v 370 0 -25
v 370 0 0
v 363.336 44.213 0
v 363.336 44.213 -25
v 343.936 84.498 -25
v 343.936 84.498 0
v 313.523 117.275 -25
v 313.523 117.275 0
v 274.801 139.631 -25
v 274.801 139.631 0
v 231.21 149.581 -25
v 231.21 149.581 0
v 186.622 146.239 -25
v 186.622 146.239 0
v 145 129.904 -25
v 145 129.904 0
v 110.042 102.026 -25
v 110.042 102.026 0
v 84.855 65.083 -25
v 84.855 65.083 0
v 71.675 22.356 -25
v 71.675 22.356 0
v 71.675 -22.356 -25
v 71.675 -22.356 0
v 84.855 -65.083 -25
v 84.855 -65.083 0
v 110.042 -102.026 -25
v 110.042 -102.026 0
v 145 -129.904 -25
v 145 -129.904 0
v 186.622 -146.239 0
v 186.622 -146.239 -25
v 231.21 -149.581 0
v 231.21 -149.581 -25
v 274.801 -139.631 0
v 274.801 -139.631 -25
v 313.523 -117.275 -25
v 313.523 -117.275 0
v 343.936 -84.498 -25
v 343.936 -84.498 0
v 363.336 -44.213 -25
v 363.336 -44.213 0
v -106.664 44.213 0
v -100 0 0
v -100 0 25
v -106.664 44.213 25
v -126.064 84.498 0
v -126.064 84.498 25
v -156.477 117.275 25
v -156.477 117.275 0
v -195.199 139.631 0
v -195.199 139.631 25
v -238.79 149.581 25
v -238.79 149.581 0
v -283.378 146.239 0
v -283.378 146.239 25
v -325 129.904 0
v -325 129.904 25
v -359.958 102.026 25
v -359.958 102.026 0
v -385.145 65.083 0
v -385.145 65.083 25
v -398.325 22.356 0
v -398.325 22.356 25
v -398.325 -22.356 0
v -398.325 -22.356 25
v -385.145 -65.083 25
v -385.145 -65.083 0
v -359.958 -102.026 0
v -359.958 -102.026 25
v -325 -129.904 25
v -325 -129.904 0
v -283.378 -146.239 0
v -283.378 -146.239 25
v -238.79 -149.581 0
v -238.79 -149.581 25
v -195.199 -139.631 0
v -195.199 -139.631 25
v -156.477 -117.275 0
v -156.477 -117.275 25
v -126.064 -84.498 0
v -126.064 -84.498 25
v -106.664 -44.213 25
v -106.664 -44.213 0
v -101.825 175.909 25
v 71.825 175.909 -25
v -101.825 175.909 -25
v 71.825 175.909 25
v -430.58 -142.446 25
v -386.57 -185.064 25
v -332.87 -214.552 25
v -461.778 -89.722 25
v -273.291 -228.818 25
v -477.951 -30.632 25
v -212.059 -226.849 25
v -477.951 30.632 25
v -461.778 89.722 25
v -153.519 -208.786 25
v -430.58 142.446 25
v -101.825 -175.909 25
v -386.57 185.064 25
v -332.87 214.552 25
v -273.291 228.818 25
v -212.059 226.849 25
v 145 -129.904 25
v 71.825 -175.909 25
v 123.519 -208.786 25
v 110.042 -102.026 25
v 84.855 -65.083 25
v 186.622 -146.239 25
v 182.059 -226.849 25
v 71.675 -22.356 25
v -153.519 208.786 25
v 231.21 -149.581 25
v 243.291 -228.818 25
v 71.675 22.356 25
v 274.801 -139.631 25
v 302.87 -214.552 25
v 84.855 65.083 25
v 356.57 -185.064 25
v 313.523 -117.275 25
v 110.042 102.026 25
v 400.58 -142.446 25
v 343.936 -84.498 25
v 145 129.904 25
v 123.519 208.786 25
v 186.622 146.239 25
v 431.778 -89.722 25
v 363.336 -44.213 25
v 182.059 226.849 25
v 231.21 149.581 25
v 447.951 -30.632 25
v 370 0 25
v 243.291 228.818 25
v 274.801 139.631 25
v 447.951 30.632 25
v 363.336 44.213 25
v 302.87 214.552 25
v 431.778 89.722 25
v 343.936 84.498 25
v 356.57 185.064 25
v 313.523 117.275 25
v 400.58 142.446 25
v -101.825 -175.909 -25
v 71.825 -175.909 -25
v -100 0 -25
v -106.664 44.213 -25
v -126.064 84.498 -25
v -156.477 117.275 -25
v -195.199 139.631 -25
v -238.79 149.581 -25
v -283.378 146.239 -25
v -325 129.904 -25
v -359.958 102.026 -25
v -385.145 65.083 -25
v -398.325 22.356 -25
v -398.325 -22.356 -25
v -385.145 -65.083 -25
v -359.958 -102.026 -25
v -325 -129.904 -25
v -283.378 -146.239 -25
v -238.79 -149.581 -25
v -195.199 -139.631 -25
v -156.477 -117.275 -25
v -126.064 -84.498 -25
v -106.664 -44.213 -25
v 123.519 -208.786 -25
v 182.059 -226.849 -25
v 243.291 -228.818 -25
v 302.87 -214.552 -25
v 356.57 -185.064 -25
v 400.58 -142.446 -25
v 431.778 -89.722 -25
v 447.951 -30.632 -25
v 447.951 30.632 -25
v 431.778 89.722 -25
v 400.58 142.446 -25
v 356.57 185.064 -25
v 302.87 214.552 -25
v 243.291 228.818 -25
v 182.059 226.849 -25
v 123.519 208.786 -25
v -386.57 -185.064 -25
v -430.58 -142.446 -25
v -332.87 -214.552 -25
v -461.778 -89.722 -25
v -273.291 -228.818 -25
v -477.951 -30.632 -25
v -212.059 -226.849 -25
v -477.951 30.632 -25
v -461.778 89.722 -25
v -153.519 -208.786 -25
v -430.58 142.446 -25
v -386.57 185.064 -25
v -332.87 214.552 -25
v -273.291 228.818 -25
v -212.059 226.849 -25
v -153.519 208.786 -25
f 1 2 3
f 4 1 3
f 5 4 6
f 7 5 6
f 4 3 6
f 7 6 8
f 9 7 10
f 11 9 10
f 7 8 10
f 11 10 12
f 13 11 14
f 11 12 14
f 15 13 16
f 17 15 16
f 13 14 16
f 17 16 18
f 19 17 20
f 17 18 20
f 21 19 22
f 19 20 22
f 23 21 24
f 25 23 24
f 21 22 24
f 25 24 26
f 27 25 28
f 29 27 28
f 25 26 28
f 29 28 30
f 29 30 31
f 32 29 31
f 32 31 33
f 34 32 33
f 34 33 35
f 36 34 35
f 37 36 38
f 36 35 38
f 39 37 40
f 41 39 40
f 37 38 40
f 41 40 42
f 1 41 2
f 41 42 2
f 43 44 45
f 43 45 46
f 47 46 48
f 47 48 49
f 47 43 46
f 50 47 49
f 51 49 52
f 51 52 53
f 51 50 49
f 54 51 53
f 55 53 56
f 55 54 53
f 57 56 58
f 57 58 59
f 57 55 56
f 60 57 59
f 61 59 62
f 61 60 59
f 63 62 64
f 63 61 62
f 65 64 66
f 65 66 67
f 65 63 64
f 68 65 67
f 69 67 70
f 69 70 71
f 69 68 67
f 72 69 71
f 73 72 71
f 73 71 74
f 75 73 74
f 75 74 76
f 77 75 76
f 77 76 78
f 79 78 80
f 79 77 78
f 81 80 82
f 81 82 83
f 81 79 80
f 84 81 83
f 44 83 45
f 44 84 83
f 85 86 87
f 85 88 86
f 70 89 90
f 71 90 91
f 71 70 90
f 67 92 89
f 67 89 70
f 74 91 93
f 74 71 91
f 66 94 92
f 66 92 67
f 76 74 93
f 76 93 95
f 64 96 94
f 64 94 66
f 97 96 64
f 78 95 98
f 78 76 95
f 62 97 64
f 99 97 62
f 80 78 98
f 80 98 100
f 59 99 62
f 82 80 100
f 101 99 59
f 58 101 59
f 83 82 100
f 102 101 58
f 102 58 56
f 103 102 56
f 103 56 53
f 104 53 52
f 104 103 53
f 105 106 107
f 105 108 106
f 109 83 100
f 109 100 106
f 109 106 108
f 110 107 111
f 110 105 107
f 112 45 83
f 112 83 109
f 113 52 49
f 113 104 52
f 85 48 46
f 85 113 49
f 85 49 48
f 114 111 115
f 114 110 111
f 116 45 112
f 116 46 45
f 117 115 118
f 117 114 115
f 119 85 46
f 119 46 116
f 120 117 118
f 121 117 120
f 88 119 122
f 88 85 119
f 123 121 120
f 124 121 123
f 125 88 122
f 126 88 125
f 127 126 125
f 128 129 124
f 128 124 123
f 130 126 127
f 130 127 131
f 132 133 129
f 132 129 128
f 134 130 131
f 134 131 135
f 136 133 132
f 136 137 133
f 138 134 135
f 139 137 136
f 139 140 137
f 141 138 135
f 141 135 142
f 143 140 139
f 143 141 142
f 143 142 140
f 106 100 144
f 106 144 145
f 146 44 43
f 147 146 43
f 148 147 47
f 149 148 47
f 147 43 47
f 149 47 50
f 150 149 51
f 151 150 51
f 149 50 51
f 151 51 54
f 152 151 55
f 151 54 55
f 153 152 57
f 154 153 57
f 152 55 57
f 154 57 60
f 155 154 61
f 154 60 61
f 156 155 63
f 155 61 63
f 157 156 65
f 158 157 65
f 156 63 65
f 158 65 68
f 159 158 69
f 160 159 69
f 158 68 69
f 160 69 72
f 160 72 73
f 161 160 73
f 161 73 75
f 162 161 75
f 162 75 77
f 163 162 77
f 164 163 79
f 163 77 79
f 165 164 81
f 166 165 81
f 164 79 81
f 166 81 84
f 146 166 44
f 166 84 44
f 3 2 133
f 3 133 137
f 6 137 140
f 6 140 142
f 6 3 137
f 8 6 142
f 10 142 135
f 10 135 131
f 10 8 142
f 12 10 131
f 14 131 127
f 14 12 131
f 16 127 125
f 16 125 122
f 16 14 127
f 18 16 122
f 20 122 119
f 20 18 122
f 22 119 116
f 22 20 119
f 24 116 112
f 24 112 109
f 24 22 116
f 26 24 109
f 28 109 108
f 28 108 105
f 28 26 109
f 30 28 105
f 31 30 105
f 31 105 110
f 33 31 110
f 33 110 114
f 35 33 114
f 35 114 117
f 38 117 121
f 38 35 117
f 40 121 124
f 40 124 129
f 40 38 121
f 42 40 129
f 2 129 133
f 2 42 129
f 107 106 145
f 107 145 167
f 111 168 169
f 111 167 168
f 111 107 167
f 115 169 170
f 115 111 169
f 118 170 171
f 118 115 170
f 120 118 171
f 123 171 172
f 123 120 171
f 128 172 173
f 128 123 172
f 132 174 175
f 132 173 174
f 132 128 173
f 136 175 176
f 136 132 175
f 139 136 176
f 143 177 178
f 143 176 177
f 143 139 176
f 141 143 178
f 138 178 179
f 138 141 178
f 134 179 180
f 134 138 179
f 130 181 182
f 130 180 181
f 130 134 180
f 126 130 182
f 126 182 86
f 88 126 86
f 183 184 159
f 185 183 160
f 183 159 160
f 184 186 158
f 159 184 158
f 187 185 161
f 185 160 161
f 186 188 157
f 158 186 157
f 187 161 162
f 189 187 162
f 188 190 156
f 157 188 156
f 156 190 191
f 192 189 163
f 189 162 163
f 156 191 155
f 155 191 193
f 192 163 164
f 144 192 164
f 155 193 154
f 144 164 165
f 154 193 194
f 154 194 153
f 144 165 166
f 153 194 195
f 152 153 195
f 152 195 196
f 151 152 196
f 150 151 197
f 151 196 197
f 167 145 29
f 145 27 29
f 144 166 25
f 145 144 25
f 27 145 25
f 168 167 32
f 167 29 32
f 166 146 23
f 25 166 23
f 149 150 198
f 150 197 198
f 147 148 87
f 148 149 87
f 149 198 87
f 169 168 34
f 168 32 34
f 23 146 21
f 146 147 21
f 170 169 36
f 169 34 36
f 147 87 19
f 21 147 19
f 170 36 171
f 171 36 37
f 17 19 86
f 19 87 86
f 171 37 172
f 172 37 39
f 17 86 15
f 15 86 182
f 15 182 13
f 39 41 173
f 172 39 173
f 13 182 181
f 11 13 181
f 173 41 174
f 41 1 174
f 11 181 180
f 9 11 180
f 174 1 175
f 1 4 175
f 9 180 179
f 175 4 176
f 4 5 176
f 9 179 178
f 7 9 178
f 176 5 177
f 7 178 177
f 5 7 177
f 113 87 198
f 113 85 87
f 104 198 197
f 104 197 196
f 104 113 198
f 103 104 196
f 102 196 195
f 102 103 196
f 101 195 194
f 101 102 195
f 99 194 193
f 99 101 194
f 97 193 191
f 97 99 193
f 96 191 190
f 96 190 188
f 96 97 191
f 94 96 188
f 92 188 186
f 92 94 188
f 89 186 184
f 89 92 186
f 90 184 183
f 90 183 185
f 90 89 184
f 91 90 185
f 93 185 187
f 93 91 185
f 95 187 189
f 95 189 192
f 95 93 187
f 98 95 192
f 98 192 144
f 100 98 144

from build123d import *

# Parameters (mm, degrees)
BOSS_EXTRUDE1_DEPTH      = 25
BOSS_EXTRUDE1_DEPTH_BACK = 25
SKETCH4_R                = 150
BOSS_EXTRUDE2_START      = -25
SKETCH4_4_R              = 150
BOSS_EXTRUDE2_DEPTH      = 25


with BuildPart() as part:
    # Sketch4 → Boss-Extrude1 (new, two sides: drawn at the far end of the back side and taken through both)
    with BuildSketch(Plane.XY.offset(-BOSS_EXTRUDE1_DEPTH_BACK)):
        with BuildLine():
            Line((71.8245835, 175.909198012), (-101.8245835, 175.909198012))
            ThreePointArc((-101.8245835, 175.909198012), (-480, 0), (-101.8245835, -175.909198012))
            Line((-101.8245835, -175.909198012), (71.8245835, -175.909198012))
            ThreePointArc((71.8245835, -175.909198012), (450, 0), (71.8245835, 175.909198012))
        make_face()
        with Locations((220, 0)):
            Circle(SKETCH4_R, mode=Mode.SUBTRACT)
        with Locations((-250, 0)):
            Circle(SKETCH4_R, mode=Mode.SUBTRACT)
    extrude(amount=BOSS_EXTRUDE1_DEPTH + BOSS_EXTRUDE1_DEPTH_BACK)

    # Sketch4<4> → Boss-Extrude2 (add)
    with BuildSketch(Plane.XY.offset(BOSS_EXTRUDE2_START)):
        with BuildLine():
            ThreePointArc((-20, 0), (-41.45702386, 97.004263321), (-101.8245835, 175.909198012))
            ThreePointArc((-101.8245835, 175.909198012), (-480, 0), (-101.8245835, -175.909198012))
            ThreePointArc((-101.8245835, -175.909198012), (-41.45702386, -97.004263321), (-20, 0))
        make_face()
        with Locations((-250, 0)):
            Circle(SKETCH4_4_R, mode=Mode.SUBTRACT)
    extrude(amount=BOSS_EXTRUDE2_DEPTH)


solid = part.part
